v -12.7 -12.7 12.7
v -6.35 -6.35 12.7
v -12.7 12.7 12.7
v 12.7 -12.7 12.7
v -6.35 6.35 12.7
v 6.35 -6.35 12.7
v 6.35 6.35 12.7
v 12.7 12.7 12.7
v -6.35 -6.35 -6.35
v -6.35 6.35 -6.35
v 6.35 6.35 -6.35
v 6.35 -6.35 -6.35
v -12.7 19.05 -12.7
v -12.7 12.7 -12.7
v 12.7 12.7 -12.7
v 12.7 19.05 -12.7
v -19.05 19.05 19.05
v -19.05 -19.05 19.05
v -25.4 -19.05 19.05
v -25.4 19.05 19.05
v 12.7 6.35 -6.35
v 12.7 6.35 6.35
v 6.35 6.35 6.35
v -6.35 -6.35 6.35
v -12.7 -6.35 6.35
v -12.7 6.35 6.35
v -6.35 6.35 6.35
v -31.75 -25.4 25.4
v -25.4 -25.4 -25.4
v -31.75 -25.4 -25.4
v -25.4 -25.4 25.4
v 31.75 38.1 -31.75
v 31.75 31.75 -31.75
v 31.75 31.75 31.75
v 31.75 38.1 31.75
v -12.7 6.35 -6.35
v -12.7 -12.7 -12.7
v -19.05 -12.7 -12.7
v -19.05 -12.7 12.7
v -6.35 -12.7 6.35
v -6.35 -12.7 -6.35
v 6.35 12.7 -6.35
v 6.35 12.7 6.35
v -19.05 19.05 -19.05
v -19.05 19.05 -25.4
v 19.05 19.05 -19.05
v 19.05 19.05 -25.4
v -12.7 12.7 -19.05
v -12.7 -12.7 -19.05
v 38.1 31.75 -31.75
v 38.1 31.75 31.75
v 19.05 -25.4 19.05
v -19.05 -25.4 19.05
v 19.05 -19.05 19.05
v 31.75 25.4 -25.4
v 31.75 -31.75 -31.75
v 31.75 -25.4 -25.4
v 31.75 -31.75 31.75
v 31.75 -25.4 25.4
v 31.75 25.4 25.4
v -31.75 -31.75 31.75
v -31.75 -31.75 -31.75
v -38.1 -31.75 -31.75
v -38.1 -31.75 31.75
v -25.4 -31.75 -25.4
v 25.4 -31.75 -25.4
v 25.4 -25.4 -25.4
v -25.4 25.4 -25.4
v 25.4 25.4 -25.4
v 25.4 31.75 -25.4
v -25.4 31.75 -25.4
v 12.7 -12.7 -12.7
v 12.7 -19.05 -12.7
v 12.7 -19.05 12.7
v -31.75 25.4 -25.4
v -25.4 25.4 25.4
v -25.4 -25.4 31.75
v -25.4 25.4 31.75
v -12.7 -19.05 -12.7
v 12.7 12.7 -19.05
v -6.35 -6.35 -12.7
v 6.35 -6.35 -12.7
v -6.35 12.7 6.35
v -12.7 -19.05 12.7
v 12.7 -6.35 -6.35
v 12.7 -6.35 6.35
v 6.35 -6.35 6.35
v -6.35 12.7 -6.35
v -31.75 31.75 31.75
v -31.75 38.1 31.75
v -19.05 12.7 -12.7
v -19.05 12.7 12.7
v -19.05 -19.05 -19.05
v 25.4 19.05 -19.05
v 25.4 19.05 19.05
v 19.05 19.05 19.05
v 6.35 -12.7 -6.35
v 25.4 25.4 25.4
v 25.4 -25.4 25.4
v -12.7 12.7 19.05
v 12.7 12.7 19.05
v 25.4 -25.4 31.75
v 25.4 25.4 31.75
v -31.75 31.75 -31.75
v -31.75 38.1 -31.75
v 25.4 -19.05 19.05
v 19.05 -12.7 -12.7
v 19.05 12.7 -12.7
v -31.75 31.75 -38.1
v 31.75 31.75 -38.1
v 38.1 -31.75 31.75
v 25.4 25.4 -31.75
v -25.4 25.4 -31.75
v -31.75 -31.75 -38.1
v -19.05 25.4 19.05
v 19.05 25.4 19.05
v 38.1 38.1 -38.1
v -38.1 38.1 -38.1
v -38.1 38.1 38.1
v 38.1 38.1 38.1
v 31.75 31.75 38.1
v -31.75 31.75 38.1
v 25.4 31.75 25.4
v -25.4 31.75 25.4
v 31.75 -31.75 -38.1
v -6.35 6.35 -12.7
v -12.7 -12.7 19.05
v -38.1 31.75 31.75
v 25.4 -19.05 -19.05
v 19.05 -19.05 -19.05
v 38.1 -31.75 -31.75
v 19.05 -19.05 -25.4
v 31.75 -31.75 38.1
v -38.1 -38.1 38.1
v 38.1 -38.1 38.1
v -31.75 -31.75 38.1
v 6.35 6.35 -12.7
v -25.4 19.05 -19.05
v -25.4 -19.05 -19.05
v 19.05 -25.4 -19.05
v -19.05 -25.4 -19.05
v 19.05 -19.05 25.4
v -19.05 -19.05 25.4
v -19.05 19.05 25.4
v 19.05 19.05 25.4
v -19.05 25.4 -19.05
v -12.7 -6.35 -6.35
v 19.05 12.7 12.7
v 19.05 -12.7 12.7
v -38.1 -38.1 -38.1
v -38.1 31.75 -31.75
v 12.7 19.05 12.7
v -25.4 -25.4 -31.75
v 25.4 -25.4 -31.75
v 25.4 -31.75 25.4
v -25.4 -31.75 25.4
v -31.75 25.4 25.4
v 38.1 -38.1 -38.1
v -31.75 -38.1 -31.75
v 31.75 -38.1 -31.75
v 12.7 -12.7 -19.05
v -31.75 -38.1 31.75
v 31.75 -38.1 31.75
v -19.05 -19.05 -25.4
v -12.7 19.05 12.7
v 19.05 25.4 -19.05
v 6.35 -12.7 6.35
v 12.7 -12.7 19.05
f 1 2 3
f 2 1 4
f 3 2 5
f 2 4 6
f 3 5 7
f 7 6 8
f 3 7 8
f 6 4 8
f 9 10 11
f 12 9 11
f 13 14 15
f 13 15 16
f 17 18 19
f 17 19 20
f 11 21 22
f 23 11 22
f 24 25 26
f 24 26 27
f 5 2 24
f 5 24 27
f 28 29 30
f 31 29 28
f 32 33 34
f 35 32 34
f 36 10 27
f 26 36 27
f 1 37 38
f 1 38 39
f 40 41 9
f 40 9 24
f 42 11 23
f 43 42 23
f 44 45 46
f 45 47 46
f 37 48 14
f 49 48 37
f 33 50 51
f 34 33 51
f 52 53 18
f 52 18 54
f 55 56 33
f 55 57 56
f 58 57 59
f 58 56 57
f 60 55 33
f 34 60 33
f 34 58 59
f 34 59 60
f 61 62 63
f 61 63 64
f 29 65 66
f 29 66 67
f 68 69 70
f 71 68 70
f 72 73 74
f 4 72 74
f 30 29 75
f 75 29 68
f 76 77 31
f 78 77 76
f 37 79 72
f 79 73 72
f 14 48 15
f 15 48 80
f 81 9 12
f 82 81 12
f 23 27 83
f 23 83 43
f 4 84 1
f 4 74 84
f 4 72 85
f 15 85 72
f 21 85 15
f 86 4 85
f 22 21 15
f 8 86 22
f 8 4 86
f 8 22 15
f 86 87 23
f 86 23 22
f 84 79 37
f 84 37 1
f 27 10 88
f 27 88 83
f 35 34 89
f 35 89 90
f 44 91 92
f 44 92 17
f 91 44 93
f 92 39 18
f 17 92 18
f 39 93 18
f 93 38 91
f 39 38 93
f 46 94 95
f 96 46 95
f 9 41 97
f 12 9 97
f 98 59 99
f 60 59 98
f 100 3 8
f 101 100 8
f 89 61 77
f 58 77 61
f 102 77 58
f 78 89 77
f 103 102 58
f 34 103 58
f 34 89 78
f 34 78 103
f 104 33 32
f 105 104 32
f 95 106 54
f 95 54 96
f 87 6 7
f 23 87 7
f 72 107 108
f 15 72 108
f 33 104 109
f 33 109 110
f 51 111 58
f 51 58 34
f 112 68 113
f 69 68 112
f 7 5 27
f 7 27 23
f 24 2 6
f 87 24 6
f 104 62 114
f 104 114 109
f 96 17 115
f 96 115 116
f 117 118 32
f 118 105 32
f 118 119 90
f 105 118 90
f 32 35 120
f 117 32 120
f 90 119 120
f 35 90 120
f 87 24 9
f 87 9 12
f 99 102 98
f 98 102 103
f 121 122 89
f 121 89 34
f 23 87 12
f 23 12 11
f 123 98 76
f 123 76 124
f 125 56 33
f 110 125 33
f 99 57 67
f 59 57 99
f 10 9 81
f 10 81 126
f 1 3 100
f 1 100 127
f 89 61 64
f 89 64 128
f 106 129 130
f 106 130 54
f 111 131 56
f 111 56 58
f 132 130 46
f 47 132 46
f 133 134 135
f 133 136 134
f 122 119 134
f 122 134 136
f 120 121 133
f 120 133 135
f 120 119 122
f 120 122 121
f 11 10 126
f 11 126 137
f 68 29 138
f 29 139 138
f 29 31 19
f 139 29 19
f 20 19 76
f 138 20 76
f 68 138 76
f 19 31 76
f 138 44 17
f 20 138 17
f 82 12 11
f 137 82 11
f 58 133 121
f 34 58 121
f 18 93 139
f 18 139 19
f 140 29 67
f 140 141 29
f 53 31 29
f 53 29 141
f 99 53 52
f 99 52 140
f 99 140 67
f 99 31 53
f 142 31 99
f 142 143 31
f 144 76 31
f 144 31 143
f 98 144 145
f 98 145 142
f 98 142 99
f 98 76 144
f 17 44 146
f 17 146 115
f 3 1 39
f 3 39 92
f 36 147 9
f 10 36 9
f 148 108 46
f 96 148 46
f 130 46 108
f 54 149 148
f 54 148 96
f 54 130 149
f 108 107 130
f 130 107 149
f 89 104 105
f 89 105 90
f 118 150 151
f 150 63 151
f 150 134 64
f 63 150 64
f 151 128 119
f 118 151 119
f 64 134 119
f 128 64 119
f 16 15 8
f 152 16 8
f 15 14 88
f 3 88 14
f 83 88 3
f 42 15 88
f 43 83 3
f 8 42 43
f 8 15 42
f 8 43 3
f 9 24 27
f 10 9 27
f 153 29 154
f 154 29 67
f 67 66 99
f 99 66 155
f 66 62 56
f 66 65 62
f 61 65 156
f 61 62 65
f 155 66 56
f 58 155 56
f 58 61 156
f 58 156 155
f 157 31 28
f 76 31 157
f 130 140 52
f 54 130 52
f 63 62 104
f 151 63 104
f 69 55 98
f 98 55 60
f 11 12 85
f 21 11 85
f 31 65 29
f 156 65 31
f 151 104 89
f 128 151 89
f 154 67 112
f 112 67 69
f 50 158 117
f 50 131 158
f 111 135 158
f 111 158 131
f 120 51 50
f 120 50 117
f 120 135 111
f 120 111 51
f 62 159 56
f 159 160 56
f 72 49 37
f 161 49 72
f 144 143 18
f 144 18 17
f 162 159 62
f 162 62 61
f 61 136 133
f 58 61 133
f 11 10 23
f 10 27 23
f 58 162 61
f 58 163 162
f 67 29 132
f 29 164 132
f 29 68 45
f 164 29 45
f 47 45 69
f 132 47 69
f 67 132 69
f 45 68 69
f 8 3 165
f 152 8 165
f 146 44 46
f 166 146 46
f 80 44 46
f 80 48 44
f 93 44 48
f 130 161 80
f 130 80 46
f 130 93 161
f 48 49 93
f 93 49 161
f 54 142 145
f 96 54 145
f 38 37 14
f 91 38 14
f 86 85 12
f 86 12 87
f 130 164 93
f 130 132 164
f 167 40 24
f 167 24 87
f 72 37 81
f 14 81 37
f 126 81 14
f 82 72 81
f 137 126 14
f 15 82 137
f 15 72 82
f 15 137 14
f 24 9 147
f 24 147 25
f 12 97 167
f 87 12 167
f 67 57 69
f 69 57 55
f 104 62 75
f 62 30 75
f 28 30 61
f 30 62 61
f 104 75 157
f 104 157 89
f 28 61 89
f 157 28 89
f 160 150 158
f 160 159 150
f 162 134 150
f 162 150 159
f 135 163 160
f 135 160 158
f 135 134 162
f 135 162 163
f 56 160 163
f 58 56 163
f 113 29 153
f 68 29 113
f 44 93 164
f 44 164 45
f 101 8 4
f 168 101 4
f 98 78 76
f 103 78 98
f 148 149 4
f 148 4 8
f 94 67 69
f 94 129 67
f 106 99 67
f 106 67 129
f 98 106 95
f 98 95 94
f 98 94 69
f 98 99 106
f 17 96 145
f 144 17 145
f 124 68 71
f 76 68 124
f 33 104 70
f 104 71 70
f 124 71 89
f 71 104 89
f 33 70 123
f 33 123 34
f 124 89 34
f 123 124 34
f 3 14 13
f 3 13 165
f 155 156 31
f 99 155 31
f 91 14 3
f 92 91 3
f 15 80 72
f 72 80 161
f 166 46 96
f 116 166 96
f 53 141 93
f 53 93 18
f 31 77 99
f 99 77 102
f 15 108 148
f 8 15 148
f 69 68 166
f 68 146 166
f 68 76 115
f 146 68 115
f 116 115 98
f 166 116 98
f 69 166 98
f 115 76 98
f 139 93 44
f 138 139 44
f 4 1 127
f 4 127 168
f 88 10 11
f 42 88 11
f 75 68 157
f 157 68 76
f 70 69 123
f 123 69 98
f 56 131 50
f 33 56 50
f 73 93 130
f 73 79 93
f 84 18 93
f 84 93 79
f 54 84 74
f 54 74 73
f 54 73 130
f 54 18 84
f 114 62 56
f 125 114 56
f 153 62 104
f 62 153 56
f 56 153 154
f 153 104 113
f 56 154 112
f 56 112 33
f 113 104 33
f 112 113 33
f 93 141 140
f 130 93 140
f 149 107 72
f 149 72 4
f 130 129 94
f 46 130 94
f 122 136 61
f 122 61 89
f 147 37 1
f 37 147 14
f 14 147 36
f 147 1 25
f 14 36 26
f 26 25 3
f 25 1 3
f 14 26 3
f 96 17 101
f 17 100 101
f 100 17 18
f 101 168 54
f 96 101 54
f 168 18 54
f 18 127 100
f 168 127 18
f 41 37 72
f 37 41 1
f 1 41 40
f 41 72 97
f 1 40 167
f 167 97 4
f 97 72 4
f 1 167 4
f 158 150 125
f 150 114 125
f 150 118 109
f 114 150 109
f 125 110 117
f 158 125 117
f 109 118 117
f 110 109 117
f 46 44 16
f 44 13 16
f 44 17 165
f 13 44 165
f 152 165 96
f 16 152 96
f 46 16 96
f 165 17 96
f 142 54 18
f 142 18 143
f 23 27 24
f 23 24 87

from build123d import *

# Parameters (mm, degrees)
F0_W      = 76.2
F0_H      = 76.2
F1_DEPTH  = 38.1
F2_W      = 63.5
F2_H      = 63.5
F3_DEPTH  = 38.1
F4_W      = 63.5
F4_H      = 63.5
F5_DEPTH  = 38.1
F6_W      = 63.5
F6_H      = 63.5
F7_DEPTH  = 38.1
F8_DEPTH  = 31.75
F9_W      = 50.8
F9_H      = 50.8
F10_DEPTH = 31.75
F11_W     = 50.8
F11_H     = 50.8
F12_DEPTH = 31.75
F13_W     = 50.8
F13_H     = 50.8
F14_DEPTH = 31.75
F15_DEPTH = 25.4
F16_W     = 38.1
F16_H     = 38.1
F17_DEPTH = 25.4
F18_W     = 38.1
F18_H     = 38.1
F19_DEPTH = 25.4
F20_W     = 38.1
F20_H     = 38.1
F21_DEPTH = 25.4
F22_DEPTH = 19.05
F23_W     = 25.4
F23_H     = 25.4
F24_DEPTH = 19.05
F25_W     = 25.4
F25_H     = 25.4
F26_DEPTH = 19.05
F27_W     = 25.4
F27_H     = 25.4
F28_DEPTH = 63.5
F29_DEPTH = 12.7
F30_W     = 12.7
F30_H     = 12.7
F31_DEPTH = 12.7
F32_W     = 12.7
F32_H     = 12.7
F33_DEPTH = 12.7
F34_W     = 12.7
F34_H     = 12.7
F35_DEPTH = 12.7
F36_DEPTH = 6.35


with BuildPart() as f1:
    # F0 (on Top) → F1 (new body, symmetric)
    with BuildSketch(Plane.XY):
        Rectangle(F0_W, F0_H)
    extrude(amount=F1_DEPTH, both=True)

    # F2 (on Right) → F3 (cut, symmetric)
    with BuildSketch(Plane.YZ):
        Rectangle(F2_W, F2_H)
    extrude(amount=F3_DEPTH, both=True, mode=Mode.SUBTRACT)

    # F4 (on Front) → F5 (cut, symmetric)
    with BuildSketch(Plane.XZ):
        Rectangle(F4_W, F4_H)
    extrude(amount=F5_DEPTH, both=True, mode=Mode.SUBTRACT)

    # F6 (on Top) → F7 (cut, symmetric)
    with BuildSketch(Plane.XY):
        Rectangle(F6_W, F6_H)
    extrude(amount=F7_DEPTH, both=True, mode=Mode.SUBTRACT)


with BuildPart() as f8:
    # F6 (on Top) → F8 (new body, symmetric)
    with BuildSketch(Plane.XY):
        Rectangle(F6_W, F6_H)
    extrude(amount=F8_DEPTH, both=True)

    # F9 (on Right) → F10 (cut, symmetric)
    with BuildSketch(Plane.YZ):
        Rectangle(F9_W, F9_H)
    extrude(amount=F10_DEPTH, both=True, mode=Mode.SUBTRACT)

    # F11 (on Front) → F12 (cut, symmetric)
    with BuildSketch(Plane.XZ):
        Rectangle(F11_W, F11_H)
    extrude(amount=F12_DEPTH, both=True, mode=Mode.SUBTRACT)

    # F13 (on Top) → F14 (cut, symmetric)
    with BuildSketch(Plane.XY):
        Rectangle(F13_W, F13_H)
    extrude(amount=F14_DEPTH, both=True, mode=Mode.SUBTRACT)


with BuildPart() as f15:
    # F13 (on Top) → F15 (new body, symmetric)
    with BuildSketch(Plane.XY):
        Rectangle(F13_W, F13_H)
    extrude(amount=F15_DEPTH, both=True)

    # F16 (on Top) → F17 (cut, symmetric)
    with BuildSketch(Plane.XY):
        Rectangle(F16_W, F16_H)
    extrude(amount=F17_DEPTH, both=True, mode=Mode.SUBTRACT)

    # F18 (on Right) → F19 (cut, symmetric)
    with BuildSketch(Plane.YZ):
        Rectangle(F18_W, F18_H)
    extrude(amount=F19_DEPTH, both=True, mode=Mode.SUBTRACT)

    # F20 (on Front) → F21 (cut, symmetric)
    with BuildSketch(Plane.XZ):
        Rectangle(F20_W, F20_H)
    extrude(amount=F21_DEPTH, both=True, mode=Mode.SUBTRACT)


with BuildPart() as f22:
    # F20 (on Front) → F22 (new body, symmetric)
    with BuildSketch(Plane.XZ):
        Rectangle(F20_W, F20_H)
    extrude(amount=F22_DEPTH, both=True)

    # F23 (on Front) → F24 (cut, symmetric)
    with BuildSketch(Plane.XZ):
        Rectangle(F23_W, F23_H)
    extrude(amount=F24_DEPTH, both=True, mode=Mode.SUBTRACT)

    # F25 (on Right) → F26 (cut, symmetric)
    with BuildSketch(Plane.YZ):
        Rectangle(F25_W, F25_H)
    extrude(amount=F26_DEPTH, both=True, mode=Mode.SUBTRACT)

    # F27 (on face) → F28 (cut, symmetric)
    with BuildSketch(Plane(origin=(0, 0, -19.05), x_dir=(1, 0, 0), z_dir=(0, 0, -1))):
        Rectangle(F27_W, F27_H)
    extrude(amount=F28_DEPTH, both=True, mode=Mode.SUBTRACT)


with BuildPart() as f29:
    # F25 (on Right) → F29 (new body, symmetric)
    with BuildSketch(Plane.YZ):
        Rectangle(F25_W, F25_H)
    extrude(amount=F29_DEPTH, both=True)

    # F30 (on Front) → F31 (cut, symmetric)
    with BuildSketch(Plane.XZ):
        Rectangle(F30_W, F30_H)
    extrude(amount=F31_DEPTH, both=True, mode=Mode.SUBTRACT)

    # F32 (on Right) → F33 (cut, symmetric)
    with BuildSketch(Plane.YZ):
        Rectangle(F32_W, F32_H)
    extrude(amount=F33_DEPTH, both=True, mode=Mode.SUBTRACT)

    # F34 (on Top) → F35 (cut, symmetric)
    with BuildSketch(Plane.XY):
        Rectangle(F34_W, F34_H)
    extrude(amount=F35_DEPTH, both=True, mode=Mode.SUBTRACT)


with BuildPart() as f36:
    # F34 (on Top) → F36 (new body, symmetric)
    with BuildSketch(Plane.XY):
        Rectangle(F34_W, F34_H)
    extrude(amount=F36_DEPTH, both=True)


solid = Compound([f1.part, f8.part, f15.part, f22.part, f29.part, f36.part])
